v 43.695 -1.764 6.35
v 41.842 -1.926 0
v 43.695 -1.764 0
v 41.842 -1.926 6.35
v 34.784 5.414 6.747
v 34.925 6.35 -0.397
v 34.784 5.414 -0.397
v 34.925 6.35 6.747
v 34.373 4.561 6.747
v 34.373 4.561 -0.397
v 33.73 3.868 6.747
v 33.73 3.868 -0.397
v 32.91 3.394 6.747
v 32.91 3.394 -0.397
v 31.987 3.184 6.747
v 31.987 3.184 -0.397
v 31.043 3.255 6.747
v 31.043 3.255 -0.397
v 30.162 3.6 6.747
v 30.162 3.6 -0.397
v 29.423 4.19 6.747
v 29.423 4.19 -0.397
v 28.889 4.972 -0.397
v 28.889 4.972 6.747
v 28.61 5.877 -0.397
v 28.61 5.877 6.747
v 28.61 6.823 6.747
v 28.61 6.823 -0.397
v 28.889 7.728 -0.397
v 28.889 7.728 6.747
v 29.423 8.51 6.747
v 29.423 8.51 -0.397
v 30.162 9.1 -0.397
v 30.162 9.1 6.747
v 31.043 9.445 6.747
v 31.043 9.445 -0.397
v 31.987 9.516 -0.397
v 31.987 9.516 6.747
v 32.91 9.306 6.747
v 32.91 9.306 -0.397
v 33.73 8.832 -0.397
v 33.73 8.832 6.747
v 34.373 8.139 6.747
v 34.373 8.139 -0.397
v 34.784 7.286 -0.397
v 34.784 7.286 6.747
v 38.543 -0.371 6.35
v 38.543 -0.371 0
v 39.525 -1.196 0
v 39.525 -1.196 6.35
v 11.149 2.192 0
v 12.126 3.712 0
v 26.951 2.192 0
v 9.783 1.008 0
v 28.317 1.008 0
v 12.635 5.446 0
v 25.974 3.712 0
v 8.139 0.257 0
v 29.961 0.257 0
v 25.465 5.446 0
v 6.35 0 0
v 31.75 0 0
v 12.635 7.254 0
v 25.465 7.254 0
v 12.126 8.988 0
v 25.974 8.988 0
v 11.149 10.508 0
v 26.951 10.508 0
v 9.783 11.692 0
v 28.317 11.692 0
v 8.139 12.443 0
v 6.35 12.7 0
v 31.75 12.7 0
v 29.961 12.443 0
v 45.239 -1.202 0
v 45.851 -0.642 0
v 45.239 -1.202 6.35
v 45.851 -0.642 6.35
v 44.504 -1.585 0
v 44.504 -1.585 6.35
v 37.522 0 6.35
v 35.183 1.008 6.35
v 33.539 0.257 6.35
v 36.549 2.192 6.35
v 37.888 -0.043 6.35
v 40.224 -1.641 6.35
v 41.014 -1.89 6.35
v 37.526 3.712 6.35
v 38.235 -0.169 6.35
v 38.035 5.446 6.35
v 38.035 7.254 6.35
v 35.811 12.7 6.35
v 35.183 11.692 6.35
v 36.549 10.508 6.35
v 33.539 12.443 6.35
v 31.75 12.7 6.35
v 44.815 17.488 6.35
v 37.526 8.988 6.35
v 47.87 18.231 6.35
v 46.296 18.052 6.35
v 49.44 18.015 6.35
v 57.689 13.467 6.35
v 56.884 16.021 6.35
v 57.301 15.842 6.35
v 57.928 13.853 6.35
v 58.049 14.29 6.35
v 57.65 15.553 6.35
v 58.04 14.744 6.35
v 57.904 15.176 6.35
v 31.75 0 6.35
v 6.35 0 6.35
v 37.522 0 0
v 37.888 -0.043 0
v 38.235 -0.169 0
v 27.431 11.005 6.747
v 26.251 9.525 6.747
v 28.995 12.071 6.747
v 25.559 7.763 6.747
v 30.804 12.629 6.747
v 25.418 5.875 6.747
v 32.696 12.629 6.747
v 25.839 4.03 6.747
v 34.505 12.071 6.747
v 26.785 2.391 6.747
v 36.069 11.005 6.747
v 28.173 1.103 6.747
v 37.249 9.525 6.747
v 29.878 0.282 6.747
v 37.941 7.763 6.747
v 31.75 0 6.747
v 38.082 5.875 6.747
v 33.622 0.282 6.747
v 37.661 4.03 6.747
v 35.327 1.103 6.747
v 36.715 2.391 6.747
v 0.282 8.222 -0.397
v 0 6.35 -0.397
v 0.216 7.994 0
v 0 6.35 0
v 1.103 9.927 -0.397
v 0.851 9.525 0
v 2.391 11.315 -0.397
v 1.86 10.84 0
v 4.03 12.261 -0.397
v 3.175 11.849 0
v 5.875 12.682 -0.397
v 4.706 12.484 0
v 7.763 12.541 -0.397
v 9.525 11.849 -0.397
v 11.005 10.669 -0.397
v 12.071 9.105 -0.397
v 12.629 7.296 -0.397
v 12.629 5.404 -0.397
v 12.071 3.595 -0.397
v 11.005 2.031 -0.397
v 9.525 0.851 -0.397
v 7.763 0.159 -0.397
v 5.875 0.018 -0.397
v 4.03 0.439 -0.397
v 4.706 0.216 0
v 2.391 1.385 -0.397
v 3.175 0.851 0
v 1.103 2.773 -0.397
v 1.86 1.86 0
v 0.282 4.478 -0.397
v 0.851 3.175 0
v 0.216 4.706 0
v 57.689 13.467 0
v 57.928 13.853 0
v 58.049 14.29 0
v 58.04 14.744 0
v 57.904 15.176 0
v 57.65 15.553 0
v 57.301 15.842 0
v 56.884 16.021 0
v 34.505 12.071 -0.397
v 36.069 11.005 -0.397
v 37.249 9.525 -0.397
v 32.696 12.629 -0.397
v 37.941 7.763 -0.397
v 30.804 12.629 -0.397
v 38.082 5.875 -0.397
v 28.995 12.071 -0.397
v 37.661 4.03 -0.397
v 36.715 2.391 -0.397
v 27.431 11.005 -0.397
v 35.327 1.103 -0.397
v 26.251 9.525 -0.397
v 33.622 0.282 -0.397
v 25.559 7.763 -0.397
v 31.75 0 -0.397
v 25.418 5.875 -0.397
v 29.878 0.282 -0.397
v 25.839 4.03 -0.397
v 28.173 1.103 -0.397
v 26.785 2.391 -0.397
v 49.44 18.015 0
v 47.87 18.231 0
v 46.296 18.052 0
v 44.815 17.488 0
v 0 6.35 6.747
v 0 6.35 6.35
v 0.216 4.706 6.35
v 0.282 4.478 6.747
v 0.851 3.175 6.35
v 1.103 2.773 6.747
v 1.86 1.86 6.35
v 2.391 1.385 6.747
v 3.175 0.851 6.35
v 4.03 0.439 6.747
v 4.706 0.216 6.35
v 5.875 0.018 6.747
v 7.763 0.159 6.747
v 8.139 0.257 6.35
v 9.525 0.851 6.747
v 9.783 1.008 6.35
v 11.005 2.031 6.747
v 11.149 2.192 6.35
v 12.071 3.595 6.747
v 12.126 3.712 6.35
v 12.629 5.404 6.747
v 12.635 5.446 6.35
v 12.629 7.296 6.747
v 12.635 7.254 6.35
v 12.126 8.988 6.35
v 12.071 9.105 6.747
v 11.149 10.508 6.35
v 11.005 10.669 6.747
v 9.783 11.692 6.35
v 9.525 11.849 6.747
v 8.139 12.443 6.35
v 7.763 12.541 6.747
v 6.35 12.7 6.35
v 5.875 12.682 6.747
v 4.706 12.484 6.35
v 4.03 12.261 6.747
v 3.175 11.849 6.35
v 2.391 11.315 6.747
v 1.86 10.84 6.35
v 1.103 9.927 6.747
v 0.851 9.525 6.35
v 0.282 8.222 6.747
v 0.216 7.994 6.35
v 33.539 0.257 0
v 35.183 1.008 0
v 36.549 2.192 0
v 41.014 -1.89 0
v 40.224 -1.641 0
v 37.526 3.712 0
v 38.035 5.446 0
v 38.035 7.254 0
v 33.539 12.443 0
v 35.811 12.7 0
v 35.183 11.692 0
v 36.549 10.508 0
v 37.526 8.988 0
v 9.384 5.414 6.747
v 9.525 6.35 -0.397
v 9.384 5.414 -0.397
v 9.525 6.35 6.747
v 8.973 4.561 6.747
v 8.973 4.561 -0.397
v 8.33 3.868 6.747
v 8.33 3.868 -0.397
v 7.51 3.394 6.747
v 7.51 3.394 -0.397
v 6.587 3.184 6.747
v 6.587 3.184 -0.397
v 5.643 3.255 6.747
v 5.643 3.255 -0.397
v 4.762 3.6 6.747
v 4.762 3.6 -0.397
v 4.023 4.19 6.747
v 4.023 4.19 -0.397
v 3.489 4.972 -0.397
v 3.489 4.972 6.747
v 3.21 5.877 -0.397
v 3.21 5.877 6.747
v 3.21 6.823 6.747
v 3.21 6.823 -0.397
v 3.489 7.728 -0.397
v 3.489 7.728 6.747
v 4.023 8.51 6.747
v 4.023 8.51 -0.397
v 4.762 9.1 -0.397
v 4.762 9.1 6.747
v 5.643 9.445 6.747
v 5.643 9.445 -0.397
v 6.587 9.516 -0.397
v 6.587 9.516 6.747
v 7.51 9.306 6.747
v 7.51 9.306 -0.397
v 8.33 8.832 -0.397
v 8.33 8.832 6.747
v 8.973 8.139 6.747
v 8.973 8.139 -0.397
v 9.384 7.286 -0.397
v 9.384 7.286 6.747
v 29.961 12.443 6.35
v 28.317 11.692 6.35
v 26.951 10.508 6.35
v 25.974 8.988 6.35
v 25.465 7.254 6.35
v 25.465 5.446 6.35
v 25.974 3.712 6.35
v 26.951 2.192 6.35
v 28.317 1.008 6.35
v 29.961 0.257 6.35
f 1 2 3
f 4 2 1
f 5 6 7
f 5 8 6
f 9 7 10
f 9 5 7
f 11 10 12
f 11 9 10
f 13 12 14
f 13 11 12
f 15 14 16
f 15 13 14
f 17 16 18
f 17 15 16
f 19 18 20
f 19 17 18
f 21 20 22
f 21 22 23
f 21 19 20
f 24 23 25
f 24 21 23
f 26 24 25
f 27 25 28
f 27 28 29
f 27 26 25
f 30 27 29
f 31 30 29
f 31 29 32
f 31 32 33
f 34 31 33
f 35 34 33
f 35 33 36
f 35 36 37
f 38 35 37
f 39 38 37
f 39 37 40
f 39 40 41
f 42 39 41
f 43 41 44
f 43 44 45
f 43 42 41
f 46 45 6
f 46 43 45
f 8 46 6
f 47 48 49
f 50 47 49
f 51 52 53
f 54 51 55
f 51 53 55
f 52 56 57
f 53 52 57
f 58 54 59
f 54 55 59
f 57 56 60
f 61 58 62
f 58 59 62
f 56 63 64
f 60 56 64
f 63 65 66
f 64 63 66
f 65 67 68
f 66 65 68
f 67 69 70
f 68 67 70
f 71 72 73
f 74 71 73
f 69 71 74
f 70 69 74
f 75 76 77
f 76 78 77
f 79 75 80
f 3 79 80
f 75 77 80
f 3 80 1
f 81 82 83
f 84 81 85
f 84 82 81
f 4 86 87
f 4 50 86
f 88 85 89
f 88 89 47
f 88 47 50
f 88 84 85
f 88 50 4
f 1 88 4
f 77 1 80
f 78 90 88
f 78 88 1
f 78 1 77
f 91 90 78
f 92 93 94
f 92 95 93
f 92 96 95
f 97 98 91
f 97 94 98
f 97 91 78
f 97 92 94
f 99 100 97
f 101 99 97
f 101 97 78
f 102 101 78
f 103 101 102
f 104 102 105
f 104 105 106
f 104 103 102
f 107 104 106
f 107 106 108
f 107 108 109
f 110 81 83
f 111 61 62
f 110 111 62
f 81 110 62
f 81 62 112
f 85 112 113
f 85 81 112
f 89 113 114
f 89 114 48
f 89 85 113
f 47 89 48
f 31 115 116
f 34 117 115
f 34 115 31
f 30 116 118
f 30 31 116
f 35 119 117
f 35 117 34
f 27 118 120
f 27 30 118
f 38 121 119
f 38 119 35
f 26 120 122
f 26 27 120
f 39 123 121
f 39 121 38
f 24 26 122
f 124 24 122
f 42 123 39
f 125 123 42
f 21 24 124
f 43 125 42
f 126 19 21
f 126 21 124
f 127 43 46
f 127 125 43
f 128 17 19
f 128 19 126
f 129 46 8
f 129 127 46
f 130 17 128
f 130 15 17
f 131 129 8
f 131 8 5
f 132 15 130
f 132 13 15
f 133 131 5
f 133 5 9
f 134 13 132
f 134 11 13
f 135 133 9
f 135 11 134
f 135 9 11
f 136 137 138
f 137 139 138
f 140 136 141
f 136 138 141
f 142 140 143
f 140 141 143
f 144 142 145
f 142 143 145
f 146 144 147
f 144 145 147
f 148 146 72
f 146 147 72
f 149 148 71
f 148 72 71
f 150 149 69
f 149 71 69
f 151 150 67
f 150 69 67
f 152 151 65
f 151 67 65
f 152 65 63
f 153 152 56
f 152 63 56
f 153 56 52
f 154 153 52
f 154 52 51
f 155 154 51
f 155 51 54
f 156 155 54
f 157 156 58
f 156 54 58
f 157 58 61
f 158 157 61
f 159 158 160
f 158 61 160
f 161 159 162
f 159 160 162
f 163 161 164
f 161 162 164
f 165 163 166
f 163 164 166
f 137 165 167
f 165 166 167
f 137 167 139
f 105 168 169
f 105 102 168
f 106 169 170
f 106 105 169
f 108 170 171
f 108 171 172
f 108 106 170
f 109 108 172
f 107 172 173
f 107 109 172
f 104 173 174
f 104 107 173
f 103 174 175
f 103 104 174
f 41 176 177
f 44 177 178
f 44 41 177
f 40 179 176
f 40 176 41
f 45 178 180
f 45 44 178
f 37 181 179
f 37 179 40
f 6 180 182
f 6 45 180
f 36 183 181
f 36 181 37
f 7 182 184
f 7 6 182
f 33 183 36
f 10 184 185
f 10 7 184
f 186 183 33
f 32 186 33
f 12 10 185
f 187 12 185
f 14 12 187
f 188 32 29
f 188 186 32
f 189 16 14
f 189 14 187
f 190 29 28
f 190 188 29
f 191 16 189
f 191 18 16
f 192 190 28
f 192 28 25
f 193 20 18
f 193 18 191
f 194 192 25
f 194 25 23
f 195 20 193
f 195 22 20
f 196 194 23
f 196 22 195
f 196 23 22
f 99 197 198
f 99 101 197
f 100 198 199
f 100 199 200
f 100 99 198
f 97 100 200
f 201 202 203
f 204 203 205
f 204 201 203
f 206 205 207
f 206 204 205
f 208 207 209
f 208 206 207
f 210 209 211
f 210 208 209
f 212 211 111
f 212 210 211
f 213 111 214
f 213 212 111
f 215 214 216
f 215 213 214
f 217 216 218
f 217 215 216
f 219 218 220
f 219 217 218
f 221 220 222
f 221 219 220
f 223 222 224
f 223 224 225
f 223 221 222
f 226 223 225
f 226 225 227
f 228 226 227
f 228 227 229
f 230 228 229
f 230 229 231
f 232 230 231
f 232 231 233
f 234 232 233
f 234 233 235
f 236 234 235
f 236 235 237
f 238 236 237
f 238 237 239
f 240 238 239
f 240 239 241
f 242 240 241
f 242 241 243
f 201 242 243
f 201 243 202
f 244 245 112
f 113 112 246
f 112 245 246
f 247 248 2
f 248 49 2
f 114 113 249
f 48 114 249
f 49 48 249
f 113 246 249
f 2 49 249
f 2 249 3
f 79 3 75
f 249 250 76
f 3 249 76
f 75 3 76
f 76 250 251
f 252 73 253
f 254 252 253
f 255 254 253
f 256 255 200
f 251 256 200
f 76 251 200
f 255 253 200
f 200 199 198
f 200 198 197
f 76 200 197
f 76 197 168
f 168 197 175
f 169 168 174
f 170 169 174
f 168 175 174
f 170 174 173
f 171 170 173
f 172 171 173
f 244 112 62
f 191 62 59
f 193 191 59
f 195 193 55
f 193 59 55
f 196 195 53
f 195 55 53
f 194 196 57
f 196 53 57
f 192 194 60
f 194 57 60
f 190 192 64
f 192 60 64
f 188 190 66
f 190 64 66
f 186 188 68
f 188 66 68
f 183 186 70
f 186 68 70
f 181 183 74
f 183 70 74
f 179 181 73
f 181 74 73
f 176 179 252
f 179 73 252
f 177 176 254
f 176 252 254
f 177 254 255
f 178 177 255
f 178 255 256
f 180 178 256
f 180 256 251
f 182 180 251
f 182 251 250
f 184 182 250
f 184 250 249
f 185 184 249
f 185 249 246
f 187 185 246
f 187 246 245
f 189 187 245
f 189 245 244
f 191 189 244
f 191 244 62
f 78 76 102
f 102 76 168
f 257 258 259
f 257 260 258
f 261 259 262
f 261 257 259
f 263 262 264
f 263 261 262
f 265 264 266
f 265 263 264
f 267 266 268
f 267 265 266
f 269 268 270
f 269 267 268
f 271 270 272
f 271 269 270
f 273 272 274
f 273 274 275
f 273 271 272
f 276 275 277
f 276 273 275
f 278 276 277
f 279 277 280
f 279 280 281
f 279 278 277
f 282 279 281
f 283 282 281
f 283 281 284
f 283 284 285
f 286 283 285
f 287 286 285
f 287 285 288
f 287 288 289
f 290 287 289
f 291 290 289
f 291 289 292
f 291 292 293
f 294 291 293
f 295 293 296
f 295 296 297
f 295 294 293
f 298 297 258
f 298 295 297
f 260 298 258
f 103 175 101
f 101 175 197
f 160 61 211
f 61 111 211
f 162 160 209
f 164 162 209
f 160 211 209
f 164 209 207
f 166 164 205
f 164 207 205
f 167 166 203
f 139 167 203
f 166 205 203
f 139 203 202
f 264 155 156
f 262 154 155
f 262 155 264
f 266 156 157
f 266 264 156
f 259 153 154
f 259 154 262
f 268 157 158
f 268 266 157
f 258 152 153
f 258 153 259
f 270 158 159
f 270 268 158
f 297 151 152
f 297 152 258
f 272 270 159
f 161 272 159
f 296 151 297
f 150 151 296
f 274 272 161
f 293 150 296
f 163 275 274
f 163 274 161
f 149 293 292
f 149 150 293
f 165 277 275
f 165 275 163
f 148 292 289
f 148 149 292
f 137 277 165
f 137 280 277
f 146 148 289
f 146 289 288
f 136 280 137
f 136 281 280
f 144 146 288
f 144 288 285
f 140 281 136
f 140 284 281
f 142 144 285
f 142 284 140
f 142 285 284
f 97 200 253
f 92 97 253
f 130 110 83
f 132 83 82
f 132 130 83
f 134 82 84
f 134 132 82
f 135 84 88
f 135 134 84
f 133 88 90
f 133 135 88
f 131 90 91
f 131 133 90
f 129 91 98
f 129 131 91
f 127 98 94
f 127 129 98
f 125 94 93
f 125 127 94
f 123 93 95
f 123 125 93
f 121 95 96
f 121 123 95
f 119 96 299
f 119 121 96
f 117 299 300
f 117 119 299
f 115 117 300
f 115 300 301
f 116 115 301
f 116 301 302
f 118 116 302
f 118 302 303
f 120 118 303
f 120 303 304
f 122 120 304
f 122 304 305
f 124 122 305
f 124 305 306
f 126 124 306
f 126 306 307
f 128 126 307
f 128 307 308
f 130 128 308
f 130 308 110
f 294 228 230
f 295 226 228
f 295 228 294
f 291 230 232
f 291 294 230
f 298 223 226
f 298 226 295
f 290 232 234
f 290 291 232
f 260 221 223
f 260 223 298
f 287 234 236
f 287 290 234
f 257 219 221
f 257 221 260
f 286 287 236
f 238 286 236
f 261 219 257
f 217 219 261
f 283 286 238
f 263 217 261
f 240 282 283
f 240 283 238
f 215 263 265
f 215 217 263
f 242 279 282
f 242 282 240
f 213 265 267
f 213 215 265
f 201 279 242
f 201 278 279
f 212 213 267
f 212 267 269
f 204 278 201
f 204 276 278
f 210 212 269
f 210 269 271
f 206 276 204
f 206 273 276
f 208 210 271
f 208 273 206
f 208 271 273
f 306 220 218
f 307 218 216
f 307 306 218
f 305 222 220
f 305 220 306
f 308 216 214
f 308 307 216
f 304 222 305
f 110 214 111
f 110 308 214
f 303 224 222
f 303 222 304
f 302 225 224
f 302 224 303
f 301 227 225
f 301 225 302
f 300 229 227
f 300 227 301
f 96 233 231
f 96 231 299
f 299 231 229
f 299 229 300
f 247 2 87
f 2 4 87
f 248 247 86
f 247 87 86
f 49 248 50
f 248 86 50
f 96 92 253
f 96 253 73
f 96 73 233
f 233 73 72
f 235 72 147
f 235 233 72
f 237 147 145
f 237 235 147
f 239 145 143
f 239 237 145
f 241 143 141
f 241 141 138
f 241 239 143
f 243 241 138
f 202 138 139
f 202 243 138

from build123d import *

# Parameters (mm, degrees)
BOSS_EXTRUDE1_DEPTH = 6.35
FILLET1_R           = 6.35
SKETCH2_R           = 3.175
CUT_EXTRUDE1_DEPTH  = 6.35
BOSS_EXTRUDE2_START = 0.396875
SKETCH3_R           = 6.35
SKETCH3_R_2         = 3.175
BOSS_EXTRUDE2_DEPTH = 0.396875
SKETCH4_R           = 6.35
SKETCH4_R_2         = 3.175
BOSS_EXTRUDE3_DEPTH = 0.396875
FILLET2_R           = 1.5875
CHAMFER1_SIZE       = 3.175
FILLET3_R           = 3.175


with BuildPart() as part:
    # Sketch1 → Boss-Extrude1 (new body)
    with BuildSketch(Plane.XY):
        Polygon((0, 0), (38.1, 0), (42.964382214, -4.081701322), (59.2911875, 15.375827534), (47.023929506, 18.662829407), (35.810782514, 12.7), (0, 12.7), align=None)
    extrude(amount=BOSS_EXTRUDE1_DEPTH)

    # Fillet1
    fillet1_edges = [part.edges().sort_by_distance(p)[0] for p in [
        (47.023929506, 18.662829407, 3.175),
        (0, 0, 3.175),
        (0, 12.7, 3.175),
    ]]
    fillet(fillet1_edges, radius=FILLET1_R - 0.0001)  # a hair under: the kernel refuses the full size

    # Sketch2 → Cut-Extrude1 (cut)
    with BuildSketch(Plane.XY.offset(6.35)):
        with Locations((6.35, 6.35)):
            Circle(SKETCH2_R)
        with Locations((31.75, 6.35)):
            Circle(SKETCH2_R)
    extrude(amount=-CUT_EXTRUDE1_DEPTH, mode=Mode.SUBTRACT)

    # Sketch3 → Boss-Extrude2 (add)
    # profile 1 of 2: a face of its own
    with BuildSketch(Plane.XY.offset(6.35).offset(BOSS_EXTRUDE2_START)):
        with Locations(Location((31.75, 6.35, 0), (0, 0, 270))):
            Circle(SKETCH3_R)
        with Locations((31.75, 6.35)):
            Circle(SKETCH3_R_2, mode=Mode.SUBTRACT)
    # profile 2 of 2: a face of its own
    with BuildSketch(Plane.XY.offset(6.35).offset(BOSS_EXTRUDE2_START)):
        with Locations(Location((6.35, 6.35, 0), (0, 0, 180))):
            Circle(SKETCH3_R)
        with Locations((6.35, 6.35)):
            Circle(SKETCH3_R_2, mode=Mode.SUBTRACT)
    extrude(amount=-BOSS_EXTRUDE2_DEPTH)

    # Sketch4 → Boss-Extrude3 (add)
    # profile 1 of 2: a face of its own
    with BuildSketch(Plane(origin=(0, 0, 0), x_dir=(-1, 0, 0), z_dir=(0, 0, -1))):
        with Locations(Location((-31.75, 6.35, 0), (0, 0, 270))):
            Circle(SKETCH4_R)
        with Locations(Location((-31.75, 6.35, 0), (0, 0, 180))):
            Circle(SKETCH4_R_2, mode=Mode.SUBTRACT)
    # profile 2 of 2: a face of its own
    with BuildSketch(Plane(origin=(0, 0, 0), x_dir=(-1, 0, 0), z_dir=(0, 0, -1))):
        with Locations((-6.35, 6.35)):
            Circle(SKETCH4_R)
        with Locations(Location((-6.35, 6.35, 0), (0, 0, 180))):
            Circle(SKETCH4_R_2, mode=Mode.SUBTRACT)
    extrude(amount=BOSS_EXTRUDE3_DEPTH)

    # Fillet2
    fillet2_edges = [part.edges().sort_by_distance(p)[0] for p in [
        (59.2911875, 15.375827534, 3.175),
        (38.1, 0, 3.175),
    ]]
    fillet(fillet2_edges, radius=FILLET2_R)

    # Chamfer1
    chamfer1_edges = [part.edges().sort_by_distance(p)[0] for p in [
        (42.964382214, -4.081701322, 3.175),
    ]]
    chamfer(chamfer1_edges, length=CHAMFER1_SIZE)

    # Fillet3
    fillet3_edges = [part.edges().sort_by_distance(p)[0] for p in [
        (45.005232875, -1.649510215, 3.175),
        (40.532191107, -2.040850661, 3.175),
    ]]
    fillet(fillet3_edges, radius=FILLET3_R)


solid = part.part
